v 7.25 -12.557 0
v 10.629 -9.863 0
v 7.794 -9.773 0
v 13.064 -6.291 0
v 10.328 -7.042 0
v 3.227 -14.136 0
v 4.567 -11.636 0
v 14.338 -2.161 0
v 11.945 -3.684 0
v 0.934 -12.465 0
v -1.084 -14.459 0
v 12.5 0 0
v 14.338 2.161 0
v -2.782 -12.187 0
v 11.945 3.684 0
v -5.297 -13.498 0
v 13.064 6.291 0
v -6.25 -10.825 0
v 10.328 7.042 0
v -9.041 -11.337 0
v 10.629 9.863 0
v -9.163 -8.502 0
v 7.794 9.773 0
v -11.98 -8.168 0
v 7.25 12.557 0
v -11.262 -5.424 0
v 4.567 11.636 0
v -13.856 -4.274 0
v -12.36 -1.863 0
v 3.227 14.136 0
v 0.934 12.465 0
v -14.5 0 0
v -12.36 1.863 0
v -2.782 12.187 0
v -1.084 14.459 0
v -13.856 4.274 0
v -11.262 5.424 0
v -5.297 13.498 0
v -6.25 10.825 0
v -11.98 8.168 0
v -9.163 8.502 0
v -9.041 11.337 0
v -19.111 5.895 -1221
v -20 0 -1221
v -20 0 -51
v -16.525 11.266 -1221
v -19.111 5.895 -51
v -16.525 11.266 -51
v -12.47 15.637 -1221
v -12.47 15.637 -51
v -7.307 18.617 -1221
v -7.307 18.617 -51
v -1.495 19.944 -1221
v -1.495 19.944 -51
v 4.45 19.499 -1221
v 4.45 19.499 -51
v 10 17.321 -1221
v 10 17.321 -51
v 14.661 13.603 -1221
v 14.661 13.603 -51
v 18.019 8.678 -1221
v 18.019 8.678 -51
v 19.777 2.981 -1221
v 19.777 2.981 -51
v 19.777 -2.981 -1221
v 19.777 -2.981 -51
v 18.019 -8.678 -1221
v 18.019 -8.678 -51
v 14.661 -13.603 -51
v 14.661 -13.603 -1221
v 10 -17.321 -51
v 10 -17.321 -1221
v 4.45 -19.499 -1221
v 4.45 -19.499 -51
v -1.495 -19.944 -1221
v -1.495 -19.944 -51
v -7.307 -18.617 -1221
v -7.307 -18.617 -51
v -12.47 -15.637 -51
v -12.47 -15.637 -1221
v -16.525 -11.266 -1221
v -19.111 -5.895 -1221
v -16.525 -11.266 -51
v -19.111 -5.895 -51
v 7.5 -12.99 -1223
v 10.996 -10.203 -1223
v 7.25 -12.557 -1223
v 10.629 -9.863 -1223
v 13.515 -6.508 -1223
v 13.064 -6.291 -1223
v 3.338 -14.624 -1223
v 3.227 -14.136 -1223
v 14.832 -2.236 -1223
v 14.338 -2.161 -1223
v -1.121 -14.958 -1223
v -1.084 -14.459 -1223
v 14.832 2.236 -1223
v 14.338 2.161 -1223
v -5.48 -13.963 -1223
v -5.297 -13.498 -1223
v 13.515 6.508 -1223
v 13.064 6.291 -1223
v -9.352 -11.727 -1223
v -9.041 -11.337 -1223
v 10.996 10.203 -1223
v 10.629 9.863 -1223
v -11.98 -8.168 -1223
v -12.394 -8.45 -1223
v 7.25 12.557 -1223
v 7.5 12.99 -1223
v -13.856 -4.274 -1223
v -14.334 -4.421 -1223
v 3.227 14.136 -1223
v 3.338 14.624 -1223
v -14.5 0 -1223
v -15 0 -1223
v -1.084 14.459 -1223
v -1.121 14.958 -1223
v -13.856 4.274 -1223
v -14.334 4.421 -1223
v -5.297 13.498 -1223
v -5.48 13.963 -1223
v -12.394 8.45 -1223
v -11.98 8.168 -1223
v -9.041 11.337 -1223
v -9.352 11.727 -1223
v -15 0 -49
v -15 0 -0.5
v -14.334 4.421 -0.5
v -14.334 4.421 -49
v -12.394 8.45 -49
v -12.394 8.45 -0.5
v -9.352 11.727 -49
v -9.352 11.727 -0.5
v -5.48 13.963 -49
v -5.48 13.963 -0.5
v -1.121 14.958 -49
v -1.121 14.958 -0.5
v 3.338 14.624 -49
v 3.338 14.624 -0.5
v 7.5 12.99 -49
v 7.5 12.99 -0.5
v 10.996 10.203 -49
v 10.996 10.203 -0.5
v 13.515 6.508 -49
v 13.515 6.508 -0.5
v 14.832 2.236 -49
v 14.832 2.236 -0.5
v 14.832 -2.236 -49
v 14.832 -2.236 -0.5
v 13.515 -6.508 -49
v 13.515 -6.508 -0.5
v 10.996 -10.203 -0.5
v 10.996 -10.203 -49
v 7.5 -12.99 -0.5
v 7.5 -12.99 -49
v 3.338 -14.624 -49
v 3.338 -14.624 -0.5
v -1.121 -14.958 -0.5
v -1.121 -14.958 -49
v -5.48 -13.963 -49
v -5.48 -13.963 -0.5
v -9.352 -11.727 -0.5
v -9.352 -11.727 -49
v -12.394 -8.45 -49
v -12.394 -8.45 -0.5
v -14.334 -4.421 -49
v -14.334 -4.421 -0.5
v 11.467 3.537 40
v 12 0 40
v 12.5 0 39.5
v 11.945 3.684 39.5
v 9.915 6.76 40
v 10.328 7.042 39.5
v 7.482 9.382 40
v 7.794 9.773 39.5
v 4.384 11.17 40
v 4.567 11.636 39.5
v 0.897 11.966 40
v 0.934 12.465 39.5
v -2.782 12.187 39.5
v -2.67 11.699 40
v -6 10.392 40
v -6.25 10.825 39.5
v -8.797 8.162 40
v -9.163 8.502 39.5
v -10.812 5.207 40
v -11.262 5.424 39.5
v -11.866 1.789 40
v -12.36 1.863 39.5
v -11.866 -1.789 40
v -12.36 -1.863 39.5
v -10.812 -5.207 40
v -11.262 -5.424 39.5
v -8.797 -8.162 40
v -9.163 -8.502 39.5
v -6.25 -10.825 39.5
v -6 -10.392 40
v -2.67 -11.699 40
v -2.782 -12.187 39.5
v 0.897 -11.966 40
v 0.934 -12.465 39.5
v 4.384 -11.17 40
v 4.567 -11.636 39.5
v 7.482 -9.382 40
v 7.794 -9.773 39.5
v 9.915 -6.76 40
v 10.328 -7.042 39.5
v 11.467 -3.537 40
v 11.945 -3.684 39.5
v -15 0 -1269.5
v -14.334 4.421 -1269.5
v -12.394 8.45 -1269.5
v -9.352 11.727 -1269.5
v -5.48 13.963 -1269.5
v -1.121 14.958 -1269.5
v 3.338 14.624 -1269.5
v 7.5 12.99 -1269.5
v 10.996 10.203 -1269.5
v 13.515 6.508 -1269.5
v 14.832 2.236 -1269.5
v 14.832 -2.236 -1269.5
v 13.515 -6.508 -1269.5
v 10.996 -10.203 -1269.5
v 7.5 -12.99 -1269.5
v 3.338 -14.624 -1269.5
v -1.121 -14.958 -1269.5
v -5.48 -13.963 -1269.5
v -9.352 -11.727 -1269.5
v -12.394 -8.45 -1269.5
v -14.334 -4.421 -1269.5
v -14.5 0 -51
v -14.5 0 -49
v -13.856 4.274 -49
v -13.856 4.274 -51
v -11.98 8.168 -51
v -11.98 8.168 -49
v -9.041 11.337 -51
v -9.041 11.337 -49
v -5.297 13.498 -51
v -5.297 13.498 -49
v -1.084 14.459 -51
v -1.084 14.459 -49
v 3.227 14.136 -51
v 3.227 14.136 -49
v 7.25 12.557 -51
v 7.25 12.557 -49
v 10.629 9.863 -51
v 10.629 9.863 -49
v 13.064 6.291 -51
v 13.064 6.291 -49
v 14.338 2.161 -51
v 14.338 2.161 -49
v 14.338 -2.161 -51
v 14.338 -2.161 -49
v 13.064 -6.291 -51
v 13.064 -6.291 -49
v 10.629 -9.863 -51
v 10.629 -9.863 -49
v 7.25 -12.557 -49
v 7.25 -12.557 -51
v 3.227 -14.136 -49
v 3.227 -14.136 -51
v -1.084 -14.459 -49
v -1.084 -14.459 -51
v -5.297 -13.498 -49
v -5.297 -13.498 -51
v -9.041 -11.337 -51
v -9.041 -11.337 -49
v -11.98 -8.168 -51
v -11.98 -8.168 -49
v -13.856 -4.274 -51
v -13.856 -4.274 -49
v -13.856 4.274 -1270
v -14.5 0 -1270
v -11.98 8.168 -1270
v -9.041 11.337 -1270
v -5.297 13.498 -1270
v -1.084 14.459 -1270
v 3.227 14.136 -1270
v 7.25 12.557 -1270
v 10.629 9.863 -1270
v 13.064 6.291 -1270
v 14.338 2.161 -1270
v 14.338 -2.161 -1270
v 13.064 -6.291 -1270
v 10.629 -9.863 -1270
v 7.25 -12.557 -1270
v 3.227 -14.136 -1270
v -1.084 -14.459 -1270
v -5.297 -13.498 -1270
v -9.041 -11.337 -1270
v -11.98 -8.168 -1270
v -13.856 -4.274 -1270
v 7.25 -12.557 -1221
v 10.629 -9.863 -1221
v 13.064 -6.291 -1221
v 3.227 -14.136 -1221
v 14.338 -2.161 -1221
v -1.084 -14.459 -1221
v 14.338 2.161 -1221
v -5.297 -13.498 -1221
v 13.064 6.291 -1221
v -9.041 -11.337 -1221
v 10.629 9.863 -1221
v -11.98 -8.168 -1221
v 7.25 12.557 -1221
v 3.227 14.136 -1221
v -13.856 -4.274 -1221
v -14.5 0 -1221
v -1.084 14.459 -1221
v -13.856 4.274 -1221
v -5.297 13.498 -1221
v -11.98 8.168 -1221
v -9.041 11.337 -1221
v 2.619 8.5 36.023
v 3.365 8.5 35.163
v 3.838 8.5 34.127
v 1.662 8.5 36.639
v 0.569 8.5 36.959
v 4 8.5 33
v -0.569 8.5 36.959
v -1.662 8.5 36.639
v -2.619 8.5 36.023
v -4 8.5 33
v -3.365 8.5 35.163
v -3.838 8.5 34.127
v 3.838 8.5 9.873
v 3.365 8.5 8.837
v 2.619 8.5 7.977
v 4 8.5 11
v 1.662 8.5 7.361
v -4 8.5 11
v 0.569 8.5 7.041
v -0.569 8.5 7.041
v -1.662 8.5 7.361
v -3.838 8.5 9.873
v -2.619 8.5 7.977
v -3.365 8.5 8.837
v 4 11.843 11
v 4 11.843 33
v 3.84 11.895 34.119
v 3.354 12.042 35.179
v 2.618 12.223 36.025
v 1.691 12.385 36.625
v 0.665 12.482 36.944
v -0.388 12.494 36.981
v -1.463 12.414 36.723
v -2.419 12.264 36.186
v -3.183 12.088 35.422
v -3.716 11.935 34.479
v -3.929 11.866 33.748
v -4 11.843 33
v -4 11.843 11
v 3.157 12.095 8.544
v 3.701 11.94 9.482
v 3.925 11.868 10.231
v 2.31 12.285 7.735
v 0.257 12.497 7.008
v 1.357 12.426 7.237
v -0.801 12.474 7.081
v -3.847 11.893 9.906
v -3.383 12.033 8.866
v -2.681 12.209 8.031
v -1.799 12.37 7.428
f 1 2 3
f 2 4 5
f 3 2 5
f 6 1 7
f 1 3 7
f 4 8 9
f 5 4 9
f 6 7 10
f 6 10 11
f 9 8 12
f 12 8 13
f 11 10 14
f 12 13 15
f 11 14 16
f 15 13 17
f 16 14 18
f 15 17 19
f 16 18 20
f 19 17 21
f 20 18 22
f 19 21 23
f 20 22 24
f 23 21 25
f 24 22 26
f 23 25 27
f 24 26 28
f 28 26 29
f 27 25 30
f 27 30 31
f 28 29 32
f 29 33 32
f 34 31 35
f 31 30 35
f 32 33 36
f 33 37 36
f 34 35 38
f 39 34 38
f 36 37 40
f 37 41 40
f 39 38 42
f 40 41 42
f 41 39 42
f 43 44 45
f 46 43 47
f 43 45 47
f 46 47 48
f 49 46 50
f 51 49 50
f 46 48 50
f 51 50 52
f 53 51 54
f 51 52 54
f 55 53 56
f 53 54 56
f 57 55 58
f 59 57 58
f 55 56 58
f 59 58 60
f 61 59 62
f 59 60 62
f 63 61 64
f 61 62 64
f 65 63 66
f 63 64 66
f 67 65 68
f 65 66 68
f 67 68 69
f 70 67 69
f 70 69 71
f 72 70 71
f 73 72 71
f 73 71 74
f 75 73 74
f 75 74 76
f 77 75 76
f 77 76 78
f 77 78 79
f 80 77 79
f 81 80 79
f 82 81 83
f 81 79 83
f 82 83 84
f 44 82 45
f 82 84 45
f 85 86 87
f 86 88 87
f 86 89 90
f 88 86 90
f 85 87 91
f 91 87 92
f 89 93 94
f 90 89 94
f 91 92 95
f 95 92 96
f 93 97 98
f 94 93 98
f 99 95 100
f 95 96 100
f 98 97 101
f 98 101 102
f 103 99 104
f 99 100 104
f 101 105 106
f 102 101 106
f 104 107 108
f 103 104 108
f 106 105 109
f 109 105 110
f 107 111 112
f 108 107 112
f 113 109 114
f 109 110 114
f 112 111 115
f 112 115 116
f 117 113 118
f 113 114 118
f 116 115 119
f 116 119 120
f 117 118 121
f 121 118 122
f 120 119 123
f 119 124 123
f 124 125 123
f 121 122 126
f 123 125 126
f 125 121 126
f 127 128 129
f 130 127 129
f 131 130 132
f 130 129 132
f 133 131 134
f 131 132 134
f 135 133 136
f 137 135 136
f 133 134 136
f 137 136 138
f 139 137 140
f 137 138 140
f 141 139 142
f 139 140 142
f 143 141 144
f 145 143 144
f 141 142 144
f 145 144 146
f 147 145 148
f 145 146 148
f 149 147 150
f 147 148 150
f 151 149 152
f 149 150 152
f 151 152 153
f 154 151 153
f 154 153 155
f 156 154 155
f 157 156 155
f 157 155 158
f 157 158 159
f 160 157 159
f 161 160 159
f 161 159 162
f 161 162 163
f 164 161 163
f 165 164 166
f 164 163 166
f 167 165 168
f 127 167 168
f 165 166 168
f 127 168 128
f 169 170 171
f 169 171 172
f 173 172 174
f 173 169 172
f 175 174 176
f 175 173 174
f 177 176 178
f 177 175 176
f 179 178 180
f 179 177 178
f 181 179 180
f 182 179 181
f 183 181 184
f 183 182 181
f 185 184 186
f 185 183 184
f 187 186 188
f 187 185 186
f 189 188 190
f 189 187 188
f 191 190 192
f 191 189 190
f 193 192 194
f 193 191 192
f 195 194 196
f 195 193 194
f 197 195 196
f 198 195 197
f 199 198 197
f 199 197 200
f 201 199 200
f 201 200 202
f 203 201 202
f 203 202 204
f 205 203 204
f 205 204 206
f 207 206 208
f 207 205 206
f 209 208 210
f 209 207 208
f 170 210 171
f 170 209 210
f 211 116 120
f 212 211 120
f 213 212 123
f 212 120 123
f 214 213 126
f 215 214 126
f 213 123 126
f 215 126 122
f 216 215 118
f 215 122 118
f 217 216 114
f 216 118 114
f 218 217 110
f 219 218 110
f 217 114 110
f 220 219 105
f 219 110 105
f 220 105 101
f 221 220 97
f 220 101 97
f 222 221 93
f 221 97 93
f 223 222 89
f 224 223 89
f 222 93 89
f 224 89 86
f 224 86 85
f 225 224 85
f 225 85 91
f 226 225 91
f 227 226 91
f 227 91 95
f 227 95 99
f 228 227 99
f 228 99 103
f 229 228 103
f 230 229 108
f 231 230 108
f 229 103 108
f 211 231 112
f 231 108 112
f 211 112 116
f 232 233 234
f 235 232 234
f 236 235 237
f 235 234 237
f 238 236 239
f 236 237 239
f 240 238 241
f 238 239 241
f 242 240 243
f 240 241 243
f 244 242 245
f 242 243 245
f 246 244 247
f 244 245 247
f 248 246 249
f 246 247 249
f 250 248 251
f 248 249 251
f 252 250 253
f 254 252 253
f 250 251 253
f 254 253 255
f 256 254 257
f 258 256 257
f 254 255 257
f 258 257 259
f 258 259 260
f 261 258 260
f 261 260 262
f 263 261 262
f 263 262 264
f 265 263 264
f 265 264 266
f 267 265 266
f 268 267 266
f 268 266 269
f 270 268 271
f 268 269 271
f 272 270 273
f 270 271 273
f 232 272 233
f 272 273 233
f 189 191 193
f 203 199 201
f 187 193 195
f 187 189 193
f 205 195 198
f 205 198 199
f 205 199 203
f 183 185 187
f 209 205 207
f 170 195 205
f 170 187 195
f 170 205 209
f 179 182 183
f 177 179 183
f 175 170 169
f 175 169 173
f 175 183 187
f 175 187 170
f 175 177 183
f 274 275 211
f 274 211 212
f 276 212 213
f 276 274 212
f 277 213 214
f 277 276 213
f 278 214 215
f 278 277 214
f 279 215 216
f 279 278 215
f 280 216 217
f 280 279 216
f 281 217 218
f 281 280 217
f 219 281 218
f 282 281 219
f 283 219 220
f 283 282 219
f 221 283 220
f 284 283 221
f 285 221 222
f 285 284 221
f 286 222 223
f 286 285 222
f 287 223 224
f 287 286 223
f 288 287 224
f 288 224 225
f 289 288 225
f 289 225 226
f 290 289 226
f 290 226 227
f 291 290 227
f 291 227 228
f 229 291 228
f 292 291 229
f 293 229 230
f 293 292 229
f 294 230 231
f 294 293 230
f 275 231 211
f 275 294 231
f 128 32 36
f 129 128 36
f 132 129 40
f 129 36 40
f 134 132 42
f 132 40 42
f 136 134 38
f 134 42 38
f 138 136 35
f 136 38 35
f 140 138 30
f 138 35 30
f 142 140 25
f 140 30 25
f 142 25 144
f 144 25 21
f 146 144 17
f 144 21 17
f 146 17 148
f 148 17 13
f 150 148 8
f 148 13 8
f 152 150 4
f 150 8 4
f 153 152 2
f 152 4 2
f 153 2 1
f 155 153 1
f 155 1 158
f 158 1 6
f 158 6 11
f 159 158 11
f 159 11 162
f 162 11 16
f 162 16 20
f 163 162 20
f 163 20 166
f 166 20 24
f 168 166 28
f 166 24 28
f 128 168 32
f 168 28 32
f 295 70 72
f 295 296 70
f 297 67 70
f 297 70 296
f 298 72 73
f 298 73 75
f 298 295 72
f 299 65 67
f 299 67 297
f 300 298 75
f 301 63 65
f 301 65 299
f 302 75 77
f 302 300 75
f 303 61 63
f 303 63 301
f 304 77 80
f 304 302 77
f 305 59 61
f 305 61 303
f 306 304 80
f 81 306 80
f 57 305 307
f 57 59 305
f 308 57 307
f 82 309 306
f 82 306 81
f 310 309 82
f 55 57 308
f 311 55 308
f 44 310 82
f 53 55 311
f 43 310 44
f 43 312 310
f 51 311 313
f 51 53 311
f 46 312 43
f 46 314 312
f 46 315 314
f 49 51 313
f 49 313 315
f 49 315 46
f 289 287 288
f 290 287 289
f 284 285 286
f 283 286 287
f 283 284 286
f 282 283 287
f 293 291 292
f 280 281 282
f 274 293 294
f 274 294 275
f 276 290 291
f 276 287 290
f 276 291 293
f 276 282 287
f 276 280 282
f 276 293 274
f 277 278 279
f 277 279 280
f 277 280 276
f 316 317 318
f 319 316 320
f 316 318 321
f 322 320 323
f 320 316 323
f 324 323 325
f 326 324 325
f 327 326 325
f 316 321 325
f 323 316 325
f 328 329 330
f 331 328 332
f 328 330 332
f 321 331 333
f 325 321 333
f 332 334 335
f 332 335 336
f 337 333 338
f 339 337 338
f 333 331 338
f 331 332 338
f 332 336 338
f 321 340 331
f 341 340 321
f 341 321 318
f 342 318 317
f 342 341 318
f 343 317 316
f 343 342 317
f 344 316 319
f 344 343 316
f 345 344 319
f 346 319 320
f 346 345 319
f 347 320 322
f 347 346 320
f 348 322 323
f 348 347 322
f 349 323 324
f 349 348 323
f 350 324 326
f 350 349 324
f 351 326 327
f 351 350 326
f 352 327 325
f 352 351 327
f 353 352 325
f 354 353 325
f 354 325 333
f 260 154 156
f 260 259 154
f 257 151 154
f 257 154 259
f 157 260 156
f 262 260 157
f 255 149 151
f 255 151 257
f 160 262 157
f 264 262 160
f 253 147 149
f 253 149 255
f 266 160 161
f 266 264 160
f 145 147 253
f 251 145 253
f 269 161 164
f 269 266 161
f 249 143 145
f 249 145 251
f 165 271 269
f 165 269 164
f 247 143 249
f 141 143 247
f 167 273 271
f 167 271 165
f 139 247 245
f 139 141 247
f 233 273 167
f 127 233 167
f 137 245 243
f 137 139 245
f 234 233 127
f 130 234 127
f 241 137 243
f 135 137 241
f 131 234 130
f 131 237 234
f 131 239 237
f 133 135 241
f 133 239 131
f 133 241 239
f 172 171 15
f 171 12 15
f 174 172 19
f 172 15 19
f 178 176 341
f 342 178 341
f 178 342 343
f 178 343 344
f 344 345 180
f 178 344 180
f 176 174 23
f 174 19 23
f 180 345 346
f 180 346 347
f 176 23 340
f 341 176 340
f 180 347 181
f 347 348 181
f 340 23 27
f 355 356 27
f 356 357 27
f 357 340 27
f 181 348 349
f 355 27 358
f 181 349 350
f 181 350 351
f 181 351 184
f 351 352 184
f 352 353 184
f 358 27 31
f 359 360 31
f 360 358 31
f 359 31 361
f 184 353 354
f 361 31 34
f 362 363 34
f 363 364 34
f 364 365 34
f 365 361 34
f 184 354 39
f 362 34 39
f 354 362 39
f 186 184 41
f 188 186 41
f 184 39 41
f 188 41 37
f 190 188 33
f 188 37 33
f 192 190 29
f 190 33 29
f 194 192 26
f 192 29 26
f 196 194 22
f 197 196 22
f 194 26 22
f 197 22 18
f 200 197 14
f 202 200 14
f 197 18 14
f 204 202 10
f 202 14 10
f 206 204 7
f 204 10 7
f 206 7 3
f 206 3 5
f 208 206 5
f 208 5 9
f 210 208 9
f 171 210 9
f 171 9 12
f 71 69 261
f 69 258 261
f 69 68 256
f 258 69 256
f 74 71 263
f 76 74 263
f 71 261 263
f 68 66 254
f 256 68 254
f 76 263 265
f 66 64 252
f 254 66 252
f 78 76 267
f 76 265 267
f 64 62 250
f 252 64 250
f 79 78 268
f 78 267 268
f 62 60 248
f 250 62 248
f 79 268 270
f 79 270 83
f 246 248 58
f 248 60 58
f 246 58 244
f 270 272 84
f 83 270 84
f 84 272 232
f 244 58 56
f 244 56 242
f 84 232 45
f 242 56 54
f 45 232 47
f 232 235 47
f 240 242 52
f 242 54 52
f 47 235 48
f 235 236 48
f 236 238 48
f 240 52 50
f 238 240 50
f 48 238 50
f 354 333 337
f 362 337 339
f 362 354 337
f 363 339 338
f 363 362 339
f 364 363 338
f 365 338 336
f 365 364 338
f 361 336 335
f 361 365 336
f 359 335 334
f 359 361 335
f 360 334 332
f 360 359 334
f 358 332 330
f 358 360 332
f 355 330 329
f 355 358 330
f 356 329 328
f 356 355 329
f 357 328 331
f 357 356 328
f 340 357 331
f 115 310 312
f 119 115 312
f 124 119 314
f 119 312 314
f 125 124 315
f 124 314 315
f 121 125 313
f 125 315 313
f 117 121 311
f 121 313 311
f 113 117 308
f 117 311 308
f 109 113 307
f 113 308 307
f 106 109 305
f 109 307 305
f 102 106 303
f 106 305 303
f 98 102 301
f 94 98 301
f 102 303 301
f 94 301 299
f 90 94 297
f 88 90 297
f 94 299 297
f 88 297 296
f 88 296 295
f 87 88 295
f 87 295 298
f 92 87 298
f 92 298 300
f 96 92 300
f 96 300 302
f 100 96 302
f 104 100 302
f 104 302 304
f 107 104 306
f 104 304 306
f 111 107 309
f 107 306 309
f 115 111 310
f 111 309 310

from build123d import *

# Parameters (mm, degrees)
SKETCH_1_R          = 12.5
EXTRUDE_1_DEPTH     = 40
CHAMFER_1_SIZE      = 0.5
CUT_EXTRUDE_1_DEPTH = 4
SKETCH_4_R          = 15
EXTRUDE_2_DEPTH     = 49
CHAMFER_2_SIZE      = 0.5
SKETCH_7_R          = 14.5
EXTRUDE_3_DEPTH     = 2
SKETCH_8_R          = 20
EXTRUDE_4_DEPTH     = 1170
SKETCH_9_R          = 14.5
EXTRUDE_5_DEPTH     = 2
SKETCH_10_R         = 15
EXTRUDE_6_DEPTH     = 47
CHAMFER_3_SIZE      = 0.5


with BuildPart() as part:
    # 草图1 → 凸台-拉伸1 (new body)
    with BuildSketch(Plane.XY):
        Circle(SKETCH_1_R)
    extrude(amount=EXTRUDE_1_DEPTH)

    # 倒角1
    chamfer_1_edges = [part.edges().sort_by_distance(p)[0] for p in [
        (-12.5, 0, 40),
    ]]
    chamfer(chamfer_1_edges, length=CHAMFER_1_SIZE)

    # 草图3 → 切除-拉伸1 (cut)
    with BuildSketch(Plane(origin=(0, 12.5, 0), x_dir=(1, 0, 0), z_dir=(0, 1, 0))):
        with BuildLine():
            Line((4, -11), (4, -33))
            ThreePointArc((4, -33), (0, -37), (-4, -33))
            Line((-4, -33), (-4, -11))
            ThreePointArc((-4, -11), (0, -7), (4, -11))
        make_face()
    extrude(amount=-CUT_EXTRUDE_1_DEPTH, mode=Mode.SUBTRACT)

    # 草图4 → 凸台-拉伸2 (add)
    with BuildSketch(Plane(origin=(0, 0, 0), x_dir=(-1, 0, 0), z_dir=(0, 0, -1))):
        Circle(SKETCH_4_R)
    extrude(amount=EXTRUDE_2_DEPTH)

    # 倒角2
    chamfer_2_edges = [part.edges().sort_by_distance(p)[0] for p in [
        (15, 0, 0),
    ]]
    chamfer(chamfer_2_edges, length=CHAMFER_2_SIZE)

    # 草图7 → 凸台-拉伸3 (add)
    with BuildSketch(Plane(origin=(0, 0, -49), x_dir=(-1, 0, 0), z_dir=(0, 0, -1))):
        Circle(SKETCH_7_R)
    extrude(amount=EXTRUDE_3_DEPTH)

    # 草图8 → 凸台-拉伸4 (add)
    with BuildSketch(Plane(origin=(0, 0, -51), x_dir=(-1, 0, 0), z_dir=(0, 0, -1))):
        Circle(SKETCH_8_R)
    extrude(amount=EXTRUDE_4_DEPTH)

    # 草图9 → 凸台-拉伸5 (add)
    with BuildSketch(Plane(origin=(0, 0, -1221), x_dir=(-1, 0, 0), z_dir=(0, 0, -1))):
        Circle(SKETCH_9_R)
    extrude(amount=EXTRUDE_5_DEPTH)

    # 草图10 → 凸台-拉伸6 (add)
    with BuildSketch(Plane(origin=(0, 0, -1223), x_dir=(-1, 0, 0), z_dir=(0, 0, -1))):
        Circle(SKETCH_10_R)
    extrude(amount=EXTRUDE_6_DEPTH)

    # 倒角3
    chamfer_3_edges = [part.edges().sort_by_distance(p)[0] for p in [
        (15, 0, -1270),
    ]]
    chamfer(chamfer_3_edges, length=CHAMFER_3_SIZE)


solid = part.part
